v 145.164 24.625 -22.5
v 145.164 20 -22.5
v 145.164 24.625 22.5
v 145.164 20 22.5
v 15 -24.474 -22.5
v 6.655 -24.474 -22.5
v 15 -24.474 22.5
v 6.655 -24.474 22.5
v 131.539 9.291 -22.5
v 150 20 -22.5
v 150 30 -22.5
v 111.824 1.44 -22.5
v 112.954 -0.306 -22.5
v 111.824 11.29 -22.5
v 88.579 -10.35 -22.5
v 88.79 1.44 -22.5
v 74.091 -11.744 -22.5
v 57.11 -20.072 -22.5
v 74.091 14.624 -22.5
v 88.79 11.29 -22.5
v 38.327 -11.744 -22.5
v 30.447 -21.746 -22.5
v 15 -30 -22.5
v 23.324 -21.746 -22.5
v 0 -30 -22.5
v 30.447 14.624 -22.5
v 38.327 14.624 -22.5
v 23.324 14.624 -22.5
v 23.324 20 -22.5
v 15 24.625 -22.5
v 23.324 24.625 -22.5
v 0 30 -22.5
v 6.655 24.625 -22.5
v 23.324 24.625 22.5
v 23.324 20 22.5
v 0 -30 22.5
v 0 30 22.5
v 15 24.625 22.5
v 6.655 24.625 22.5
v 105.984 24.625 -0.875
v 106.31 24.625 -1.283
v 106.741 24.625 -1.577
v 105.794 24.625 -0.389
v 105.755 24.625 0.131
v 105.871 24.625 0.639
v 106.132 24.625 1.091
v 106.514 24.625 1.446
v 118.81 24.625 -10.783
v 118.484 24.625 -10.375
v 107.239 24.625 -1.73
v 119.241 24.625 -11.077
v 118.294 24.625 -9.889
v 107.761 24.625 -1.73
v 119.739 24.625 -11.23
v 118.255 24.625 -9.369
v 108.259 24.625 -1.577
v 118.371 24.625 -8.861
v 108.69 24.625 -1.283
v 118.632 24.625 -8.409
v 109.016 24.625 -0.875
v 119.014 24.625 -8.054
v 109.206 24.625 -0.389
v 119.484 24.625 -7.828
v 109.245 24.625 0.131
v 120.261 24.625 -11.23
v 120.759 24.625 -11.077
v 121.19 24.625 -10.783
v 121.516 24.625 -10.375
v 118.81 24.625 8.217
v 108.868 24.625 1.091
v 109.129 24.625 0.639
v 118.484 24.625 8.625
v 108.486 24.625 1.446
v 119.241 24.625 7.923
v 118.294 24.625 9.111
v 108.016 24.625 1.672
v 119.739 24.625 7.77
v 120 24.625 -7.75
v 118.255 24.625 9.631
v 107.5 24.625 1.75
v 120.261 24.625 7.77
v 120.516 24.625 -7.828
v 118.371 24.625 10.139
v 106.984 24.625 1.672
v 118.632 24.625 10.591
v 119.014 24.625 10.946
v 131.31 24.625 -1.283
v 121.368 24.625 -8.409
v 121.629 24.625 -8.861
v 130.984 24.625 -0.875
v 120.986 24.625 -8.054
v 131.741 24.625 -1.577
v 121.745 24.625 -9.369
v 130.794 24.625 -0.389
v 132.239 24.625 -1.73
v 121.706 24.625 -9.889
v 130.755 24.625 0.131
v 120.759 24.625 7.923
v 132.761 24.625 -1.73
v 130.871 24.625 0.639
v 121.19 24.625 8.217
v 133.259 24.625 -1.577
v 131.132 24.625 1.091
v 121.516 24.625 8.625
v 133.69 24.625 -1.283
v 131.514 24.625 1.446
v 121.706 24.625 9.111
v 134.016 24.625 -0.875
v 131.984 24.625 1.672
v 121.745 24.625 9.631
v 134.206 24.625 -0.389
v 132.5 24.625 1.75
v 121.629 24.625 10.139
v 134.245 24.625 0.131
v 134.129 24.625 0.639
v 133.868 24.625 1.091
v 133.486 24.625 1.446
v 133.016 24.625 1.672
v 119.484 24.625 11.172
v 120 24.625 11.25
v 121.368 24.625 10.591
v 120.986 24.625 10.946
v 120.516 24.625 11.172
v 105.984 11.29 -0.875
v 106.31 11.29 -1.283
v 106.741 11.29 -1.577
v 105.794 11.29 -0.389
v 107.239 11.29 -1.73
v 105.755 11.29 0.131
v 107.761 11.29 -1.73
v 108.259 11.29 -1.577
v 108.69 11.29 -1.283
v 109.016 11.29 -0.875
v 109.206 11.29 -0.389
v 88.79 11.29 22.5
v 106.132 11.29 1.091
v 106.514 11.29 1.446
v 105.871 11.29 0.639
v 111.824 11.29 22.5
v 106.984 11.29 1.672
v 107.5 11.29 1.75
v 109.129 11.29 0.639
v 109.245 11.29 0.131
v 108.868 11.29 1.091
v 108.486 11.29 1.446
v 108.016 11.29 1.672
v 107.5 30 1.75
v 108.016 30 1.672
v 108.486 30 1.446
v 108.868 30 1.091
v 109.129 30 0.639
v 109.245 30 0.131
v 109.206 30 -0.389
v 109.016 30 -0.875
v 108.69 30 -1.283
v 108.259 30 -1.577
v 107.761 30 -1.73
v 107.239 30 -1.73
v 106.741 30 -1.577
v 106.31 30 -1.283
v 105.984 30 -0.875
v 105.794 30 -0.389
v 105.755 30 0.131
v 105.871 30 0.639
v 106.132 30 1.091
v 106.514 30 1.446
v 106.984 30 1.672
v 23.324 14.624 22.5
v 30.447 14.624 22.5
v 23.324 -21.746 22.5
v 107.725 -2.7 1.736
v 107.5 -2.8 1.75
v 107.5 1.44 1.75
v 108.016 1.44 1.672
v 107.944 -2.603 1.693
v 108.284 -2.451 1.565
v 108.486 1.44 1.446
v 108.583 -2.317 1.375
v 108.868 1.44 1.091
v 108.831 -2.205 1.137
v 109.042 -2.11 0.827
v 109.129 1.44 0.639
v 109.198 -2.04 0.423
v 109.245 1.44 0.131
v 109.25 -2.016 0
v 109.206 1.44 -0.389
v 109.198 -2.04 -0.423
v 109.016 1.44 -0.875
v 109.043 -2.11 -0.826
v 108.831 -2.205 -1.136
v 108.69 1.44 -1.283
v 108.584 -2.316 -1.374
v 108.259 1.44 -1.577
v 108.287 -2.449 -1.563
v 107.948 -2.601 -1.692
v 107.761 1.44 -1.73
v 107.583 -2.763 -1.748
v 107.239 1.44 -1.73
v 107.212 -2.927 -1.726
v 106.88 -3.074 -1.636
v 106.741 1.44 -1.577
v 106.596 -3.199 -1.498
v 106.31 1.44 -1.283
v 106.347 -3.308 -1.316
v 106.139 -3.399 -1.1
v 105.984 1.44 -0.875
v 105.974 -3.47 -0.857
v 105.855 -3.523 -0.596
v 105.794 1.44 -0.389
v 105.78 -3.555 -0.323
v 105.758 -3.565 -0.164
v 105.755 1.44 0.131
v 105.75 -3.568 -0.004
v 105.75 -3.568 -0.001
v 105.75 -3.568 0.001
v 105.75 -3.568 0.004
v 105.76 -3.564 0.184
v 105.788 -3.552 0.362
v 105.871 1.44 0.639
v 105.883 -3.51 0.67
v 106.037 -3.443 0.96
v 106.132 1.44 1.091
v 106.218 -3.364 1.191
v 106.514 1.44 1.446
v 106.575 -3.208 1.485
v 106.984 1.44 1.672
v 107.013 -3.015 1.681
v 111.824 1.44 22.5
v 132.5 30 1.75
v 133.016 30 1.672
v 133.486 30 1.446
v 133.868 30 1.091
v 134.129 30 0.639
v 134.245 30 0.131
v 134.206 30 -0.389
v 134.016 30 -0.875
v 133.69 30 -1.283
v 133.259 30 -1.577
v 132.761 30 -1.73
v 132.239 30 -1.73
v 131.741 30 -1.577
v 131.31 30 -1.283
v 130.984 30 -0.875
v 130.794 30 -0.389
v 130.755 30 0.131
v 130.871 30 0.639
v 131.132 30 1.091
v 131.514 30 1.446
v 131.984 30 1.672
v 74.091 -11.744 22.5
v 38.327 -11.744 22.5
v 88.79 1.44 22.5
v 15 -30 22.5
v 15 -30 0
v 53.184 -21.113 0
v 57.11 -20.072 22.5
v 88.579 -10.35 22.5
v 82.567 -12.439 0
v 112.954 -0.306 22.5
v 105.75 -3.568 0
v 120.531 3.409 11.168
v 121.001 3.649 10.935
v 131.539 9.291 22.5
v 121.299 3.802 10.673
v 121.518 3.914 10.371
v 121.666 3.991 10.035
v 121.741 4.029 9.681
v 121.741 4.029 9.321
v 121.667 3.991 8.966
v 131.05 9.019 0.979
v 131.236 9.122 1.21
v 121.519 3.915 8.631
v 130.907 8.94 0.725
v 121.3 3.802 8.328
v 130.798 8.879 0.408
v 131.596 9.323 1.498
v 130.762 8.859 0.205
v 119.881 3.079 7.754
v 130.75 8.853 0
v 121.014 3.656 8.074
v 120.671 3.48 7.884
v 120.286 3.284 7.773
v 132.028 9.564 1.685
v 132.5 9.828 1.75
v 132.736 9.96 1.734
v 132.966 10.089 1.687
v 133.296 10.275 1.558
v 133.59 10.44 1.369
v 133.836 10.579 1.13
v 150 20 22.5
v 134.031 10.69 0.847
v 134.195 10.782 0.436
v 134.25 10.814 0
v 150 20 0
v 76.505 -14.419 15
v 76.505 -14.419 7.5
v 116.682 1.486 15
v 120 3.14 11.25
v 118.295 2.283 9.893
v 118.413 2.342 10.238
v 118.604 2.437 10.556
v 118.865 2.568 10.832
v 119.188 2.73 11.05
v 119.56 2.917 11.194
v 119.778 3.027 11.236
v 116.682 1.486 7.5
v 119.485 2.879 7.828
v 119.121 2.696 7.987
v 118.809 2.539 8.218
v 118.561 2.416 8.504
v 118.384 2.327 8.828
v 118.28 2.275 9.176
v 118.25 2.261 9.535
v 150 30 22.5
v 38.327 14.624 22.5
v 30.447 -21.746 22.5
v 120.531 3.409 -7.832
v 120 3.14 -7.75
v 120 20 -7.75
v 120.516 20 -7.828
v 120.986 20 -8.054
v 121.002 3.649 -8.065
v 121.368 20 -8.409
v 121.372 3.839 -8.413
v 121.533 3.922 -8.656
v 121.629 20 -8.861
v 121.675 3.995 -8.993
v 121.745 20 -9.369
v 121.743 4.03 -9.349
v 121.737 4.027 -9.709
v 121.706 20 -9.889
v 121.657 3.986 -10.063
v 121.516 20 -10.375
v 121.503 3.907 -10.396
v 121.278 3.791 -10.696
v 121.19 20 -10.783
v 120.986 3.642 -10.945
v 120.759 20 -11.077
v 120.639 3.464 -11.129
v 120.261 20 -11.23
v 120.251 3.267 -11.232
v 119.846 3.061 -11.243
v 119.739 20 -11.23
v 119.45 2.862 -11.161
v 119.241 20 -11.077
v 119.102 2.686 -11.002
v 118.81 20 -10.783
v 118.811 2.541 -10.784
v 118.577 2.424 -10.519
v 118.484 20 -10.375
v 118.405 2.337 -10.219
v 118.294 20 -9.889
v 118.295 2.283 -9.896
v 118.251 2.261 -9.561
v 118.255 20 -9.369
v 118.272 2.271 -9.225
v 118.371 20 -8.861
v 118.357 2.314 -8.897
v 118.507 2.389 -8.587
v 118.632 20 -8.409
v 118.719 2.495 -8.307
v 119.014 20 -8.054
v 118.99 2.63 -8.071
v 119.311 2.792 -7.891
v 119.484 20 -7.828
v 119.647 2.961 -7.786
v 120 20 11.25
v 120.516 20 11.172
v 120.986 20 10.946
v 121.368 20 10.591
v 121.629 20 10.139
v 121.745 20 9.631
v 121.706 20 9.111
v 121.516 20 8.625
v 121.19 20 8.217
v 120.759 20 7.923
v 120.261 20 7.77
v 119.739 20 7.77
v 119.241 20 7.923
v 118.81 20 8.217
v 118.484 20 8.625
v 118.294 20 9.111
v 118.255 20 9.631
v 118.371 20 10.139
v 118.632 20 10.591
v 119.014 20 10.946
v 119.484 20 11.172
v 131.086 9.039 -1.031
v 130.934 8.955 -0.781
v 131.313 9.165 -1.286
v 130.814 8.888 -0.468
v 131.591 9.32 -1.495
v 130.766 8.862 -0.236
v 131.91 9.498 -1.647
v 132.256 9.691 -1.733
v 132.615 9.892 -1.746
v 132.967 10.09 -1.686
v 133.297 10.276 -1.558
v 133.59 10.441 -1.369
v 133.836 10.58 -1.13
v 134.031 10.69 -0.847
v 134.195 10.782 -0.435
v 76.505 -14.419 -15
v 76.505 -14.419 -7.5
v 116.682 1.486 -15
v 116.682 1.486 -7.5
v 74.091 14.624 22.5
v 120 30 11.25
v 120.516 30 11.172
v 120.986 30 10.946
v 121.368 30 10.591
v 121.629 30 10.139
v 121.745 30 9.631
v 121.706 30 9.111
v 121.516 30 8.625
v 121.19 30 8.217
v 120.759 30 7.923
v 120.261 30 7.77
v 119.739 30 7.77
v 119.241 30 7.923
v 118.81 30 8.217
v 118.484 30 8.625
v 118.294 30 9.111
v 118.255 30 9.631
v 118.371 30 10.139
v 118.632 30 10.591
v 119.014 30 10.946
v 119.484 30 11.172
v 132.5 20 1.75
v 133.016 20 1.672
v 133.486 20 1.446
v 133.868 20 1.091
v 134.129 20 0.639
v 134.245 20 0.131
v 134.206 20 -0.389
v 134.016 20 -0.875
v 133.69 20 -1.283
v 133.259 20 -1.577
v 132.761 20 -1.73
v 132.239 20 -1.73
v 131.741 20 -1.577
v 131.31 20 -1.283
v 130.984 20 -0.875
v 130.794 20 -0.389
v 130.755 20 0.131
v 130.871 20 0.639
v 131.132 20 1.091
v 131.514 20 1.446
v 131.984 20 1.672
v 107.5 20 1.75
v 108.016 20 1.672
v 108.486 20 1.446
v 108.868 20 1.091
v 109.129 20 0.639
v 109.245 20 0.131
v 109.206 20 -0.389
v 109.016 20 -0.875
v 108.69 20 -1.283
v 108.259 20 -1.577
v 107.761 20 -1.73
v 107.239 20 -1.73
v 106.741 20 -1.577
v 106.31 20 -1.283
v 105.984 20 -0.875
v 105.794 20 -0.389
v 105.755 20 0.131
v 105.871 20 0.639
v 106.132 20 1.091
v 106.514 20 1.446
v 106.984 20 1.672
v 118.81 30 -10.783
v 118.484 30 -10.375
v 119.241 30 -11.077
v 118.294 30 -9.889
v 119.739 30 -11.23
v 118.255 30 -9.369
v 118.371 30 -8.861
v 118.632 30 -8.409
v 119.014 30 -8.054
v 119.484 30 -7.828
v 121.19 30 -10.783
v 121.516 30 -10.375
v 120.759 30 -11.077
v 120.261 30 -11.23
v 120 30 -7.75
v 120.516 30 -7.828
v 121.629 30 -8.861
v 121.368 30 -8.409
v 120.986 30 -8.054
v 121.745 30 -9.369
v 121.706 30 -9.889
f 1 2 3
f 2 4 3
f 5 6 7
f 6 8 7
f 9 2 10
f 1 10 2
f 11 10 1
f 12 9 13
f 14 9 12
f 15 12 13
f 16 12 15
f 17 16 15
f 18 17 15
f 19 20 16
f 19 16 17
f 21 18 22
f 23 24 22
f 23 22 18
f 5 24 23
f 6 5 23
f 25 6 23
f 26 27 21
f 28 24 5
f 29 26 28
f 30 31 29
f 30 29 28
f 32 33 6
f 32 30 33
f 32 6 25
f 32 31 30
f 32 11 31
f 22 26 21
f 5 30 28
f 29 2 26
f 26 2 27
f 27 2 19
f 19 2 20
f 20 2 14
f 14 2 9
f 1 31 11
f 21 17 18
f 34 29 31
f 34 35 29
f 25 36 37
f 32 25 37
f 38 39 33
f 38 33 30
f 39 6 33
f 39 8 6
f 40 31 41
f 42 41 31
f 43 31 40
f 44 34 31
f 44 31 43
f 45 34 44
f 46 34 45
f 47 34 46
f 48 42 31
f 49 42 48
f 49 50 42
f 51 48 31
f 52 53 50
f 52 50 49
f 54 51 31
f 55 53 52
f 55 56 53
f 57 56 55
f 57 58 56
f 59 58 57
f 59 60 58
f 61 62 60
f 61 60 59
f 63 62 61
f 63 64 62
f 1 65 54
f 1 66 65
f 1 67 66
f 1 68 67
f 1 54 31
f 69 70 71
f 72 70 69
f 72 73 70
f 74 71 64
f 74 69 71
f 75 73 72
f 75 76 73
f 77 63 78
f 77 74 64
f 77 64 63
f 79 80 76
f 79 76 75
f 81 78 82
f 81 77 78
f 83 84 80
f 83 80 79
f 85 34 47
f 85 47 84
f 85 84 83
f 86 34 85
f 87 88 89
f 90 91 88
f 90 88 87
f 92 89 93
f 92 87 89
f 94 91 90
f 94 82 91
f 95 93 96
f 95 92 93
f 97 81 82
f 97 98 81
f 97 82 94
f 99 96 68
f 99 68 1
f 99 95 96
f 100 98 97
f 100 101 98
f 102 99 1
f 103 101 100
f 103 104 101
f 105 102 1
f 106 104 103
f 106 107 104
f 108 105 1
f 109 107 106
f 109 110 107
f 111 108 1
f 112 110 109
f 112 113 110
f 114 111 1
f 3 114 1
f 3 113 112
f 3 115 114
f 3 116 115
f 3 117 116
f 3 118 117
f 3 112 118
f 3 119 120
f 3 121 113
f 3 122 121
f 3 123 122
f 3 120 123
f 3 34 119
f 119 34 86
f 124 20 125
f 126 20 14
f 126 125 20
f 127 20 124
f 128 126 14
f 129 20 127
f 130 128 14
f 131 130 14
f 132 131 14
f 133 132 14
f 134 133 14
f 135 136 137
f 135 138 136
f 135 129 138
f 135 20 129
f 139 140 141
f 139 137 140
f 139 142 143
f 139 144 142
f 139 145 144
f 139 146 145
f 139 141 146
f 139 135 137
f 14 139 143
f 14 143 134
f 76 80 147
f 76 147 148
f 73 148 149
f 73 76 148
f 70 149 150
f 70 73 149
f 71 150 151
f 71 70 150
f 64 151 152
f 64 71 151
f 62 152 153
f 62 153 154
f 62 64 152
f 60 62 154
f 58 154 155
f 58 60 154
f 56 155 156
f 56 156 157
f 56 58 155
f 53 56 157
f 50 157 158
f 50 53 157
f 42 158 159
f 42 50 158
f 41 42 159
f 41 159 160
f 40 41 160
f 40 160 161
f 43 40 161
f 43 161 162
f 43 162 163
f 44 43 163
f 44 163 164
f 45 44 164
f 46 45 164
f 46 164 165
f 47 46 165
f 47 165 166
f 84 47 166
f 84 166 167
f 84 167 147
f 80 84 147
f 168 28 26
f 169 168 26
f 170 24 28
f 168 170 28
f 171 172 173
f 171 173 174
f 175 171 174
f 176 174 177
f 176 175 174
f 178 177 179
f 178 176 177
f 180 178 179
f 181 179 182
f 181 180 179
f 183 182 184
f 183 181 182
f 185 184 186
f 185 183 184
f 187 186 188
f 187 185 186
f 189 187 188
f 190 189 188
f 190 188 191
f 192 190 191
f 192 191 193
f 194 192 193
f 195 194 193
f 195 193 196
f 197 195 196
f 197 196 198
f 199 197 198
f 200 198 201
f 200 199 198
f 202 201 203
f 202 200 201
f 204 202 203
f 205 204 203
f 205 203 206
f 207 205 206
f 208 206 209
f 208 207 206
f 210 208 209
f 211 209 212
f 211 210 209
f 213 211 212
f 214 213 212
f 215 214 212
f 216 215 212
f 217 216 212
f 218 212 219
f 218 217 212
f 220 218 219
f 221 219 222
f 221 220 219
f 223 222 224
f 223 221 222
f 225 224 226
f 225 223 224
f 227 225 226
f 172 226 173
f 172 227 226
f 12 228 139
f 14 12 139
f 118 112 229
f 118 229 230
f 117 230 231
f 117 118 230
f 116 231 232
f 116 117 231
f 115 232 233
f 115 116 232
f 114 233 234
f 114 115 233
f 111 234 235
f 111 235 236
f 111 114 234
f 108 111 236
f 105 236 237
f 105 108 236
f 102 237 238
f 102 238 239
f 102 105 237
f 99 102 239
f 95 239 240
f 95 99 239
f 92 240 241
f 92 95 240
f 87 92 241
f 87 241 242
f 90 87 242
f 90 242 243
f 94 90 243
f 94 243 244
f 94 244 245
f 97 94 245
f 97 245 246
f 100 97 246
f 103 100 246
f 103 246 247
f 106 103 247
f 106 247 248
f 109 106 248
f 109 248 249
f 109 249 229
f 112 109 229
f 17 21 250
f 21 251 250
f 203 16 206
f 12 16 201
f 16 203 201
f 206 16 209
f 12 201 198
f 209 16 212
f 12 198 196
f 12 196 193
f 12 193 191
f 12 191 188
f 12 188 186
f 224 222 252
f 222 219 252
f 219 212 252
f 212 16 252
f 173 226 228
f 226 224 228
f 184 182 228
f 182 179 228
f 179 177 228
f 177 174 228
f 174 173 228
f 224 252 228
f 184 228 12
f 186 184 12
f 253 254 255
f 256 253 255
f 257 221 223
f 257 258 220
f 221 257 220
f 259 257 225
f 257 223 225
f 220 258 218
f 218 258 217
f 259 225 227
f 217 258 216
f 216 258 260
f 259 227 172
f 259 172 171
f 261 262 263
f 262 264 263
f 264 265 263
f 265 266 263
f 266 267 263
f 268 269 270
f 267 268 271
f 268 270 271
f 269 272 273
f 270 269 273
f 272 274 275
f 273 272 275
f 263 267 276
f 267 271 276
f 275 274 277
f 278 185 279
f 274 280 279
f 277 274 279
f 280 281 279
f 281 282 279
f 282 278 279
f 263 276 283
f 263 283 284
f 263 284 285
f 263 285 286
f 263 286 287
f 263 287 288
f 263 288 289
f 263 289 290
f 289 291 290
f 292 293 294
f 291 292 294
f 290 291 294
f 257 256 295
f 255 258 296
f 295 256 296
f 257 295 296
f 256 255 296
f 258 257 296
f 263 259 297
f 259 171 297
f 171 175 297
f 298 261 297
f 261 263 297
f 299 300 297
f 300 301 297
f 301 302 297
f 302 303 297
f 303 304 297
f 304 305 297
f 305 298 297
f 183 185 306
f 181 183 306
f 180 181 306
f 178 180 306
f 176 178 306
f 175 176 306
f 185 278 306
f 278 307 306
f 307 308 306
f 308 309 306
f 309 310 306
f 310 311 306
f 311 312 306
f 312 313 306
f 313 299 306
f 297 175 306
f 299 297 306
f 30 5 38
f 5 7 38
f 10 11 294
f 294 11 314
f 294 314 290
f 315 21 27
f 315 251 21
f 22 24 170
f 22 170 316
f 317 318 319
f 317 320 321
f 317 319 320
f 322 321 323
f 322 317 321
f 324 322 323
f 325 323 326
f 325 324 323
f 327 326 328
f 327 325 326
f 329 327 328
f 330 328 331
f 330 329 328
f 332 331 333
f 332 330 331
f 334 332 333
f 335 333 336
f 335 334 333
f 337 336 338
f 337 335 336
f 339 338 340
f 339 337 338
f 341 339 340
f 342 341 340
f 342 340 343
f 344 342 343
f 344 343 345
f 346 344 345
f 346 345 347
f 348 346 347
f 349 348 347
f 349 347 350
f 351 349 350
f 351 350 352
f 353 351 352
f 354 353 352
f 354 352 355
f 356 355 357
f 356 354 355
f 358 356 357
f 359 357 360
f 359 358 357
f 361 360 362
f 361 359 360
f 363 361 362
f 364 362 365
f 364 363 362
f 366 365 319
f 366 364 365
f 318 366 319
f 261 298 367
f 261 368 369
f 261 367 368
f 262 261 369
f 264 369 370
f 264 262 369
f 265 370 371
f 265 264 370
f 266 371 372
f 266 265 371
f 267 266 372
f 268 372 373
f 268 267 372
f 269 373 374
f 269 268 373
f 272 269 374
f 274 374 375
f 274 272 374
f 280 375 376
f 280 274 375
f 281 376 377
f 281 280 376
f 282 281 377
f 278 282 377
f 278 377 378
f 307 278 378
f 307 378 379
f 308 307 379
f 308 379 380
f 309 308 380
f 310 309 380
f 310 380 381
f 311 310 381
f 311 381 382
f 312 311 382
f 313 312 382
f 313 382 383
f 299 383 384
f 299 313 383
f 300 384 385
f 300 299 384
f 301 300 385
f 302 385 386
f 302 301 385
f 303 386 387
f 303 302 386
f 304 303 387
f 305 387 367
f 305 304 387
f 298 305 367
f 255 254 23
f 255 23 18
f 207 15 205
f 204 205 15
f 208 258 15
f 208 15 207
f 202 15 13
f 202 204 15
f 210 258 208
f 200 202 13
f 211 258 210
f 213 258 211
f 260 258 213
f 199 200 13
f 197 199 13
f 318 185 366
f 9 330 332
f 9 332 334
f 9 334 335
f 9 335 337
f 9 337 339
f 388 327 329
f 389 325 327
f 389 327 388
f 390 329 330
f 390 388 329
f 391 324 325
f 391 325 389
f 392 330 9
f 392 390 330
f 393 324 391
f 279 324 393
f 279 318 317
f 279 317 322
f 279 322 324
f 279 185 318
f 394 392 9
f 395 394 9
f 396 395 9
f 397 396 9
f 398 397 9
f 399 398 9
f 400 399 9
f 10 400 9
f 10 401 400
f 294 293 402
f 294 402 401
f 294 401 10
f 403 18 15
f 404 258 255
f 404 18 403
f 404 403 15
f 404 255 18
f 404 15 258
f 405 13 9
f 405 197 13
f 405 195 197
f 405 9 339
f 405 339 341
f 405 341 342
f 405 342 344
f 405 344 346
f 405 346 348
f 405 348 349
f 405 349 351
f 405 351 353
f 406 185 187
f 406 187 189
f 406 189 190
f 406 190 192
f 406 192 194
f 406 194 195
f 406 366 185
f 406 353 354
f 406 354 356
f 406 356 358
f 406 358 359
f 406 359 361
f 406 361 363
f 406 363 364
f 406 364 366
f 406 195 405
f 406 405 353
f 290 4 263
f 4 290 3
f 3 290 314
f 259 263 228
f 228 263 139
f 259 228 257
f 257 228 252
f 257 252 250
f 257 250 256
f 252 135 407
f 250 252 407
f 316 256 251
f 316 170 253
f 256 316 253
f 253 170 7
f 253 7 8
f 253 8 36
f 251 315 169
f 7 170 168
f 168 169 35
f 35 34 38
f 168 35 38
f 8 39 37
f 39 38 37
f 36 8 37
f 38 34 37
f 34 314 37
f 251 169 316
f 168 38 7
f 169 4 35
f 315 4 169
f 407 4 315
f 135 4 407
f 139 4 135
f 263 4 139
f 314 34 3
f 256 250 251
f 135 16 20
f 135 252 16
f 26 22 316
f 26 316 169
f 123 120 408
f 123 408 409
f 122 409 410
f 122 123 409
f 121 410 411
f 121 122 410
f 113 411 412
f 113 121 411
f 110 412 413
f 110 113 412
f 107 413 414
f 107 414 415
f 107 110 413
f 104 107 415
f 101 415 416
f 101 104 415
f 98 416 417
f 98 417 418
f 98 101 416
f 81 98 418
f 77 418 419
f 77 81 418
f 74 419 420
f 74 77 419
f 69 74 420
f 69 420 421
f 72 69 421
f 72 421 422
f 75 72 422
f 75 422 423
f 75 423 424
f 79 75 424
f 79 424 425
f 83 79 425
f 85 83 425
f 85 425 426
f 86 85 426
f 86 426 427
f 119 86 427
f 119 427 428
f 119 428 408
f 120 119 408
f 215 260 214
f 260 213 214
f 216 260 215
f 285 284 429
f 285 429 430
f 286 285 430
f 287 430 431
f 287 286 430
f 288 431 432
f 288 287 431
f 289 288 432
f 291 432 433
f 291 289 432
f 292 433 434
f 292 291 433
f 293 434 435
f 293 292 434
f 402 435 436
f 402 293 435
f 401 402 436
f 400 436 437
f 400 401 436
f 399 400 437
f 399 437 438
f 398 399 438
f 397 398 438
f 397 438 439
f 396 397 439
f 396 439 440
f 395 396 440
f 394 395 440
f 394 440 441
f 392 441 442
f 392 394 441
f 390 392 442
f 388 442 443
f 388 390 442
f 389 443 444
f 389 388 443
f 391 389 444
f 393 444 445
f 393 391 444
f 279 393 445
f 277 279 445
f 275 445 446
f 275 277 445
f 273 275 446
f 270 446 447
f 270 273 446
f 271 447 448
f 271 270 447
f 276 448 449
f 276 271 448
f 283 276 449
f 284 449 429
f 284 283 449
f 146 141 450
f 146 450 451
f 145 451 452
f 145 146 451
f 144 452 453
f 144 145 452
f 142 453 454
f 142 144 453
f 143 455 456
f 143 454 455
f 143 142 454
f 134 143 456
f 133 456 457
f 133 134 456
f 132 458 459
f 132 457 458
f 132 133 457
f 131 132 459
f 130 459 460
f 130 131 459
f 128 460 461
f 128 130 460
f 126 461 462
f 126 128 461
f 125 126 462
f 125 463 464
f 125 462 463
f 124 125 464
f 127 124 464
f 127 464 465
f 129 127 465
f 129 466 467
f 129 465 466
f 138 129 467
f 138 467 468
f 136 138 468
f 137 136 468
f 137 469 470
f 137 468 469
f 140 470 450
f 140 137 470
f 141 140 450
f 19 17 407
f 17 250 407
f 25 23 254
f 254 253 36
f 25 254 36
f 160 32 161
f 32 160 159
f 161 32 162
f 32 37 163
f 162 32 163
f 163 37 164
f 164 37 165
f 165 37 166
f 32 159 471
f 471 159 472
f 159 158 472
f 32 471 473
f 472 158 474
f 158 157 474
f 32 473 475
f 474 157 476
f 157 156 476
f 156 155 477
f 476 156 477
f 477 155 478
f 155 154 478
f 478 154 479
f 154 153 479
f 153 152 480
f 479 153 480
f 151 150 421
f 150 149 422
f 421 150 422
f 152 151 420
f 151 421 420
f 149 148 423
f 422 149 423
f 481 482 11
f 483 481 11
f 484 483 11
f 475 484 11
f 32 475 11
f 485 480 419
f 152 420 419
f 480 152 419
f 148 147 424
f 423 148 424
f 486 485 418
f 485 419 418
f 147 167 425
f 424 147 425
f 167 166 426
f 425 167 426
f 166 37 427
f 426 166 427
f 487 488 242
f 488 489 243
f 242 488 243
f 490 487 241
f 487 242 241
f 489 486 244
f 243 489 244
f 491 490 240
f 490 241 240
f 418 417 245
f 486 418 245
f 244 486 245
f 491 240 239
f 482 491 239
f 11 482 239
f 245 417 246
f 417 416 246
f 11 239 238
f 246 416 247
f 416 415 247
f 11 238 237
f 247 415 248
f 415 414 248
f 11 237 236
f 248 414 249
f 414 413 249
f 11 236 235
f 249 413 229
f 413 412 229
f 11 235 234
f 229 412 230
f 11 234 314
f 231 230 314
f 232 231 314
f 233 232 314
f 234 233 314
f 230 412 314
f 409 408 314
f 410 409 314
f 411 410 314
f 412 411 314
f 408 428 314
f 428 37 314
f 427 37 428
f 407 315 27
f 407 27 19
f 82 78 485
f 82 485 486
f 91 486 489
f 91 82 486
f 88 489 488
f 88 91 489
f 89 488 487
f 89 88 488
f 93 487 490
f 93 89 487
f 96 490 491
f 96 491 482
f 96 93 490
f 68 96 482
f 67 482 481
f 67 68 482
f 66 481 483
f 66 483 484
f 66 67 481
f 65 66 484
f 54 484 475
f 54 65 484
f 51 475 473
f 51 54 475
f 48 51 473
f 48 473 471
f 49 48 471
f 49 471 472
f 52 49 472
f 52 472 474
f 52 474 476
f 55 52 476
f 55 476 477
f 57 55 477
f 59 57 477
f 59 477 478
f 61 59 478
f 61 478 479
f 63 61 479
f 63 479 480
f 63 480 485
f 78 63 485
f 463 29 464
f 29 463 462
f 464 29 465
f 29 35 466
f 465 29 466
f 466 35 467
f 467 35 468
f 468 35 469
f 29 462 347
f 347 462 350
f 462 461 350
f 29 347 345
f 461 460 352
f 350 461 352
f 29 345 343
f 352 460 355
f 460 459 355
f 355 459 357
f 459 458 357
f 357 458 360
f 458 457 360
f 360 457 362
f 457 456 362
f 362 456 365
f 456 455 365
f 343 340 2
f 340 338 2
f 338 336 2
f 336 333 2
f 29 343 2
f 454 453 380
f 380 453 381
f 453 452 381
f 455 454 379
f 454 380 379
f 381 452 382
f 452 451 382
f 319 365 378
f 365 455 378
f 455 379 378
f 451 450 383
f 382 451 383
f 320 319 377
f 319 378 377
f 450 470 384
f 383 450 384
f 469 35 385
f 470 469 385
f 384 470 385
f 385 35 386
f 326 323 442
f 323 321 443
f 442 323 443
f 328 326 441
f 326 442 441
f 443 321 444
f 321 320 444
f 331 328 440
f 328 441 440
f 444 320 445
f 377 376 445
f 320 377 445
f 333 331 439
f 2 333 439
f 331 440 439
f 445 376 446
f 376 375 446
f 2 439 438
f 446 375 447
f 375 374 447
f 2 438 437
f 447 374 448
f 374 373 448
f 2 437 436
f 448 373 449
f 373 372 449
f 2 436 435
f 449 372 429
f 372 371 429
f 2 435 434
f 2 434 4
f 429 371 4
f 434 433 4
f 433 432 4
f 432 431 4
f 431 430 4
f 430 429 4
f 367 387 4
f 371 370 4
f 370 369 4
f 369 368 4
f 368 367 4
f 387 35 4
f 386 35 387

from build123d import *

# Parameters (mm, degrees)
SKETCH3_W           = 8.345017316
SKETCH3_H           = 49.099302906
SKETCH3_W_2         = 121.839010914
SKETCH3_H_2         = 4.625421982
SKETCH3_W_3         = 7.122429743
SKETCH3_H_3         = 36.369854004
SKETCH3_W_4         = 35.763689771
SKETCH3_H_4         = 26.368144153
SKETCH3_W_5         = 23.034240869
SKETCH3_H_5         = 9.850168793
BOSS_EXTRUDE1_DEPTH = 22.5
CUT_EXTRUDE1_START  = -3.567987
SKETCH4_R           = 1.75
CUT_EXTRUDE1_DEPTH  = 33.567987


with BuildPart() as part:
    # Sketch3 → Boss-Extrude1 (new, symmetric)
    with BuildSketch(Plane.XY):
        with BuildLine():
            Line((0, -30), (0, 30))
            Line((0, 30), (150, 30))
            Line((150, 30), (150, 20))
            add(Edge.make_bspline(
                [(15, -30), (91.992434152, -13.820271626), (115.288714067, -0.58029396), (150, 20)],
                knots=[0, 0, 0, 0, 1, 1, 1, 1], degree=3))
            Line((15, -30), (0, -30))
        make_face()
        with Locations((10.827491342, 0.075770529)):
            Rectangle(SKETCH3_W, SKETCH3_H, mode=Mode.SUBTRACT)
        with Locations((84.244004559, 22.312710991)):
            Rectangle(SKETCH3_W_2, SKETCH3_H_2, mode=Mode.SUBTRACT)
        with Locations((26.885713974, -3.561214871)):
            Rectangle(SKETCH3_W_3, SKETCH3_H_3, mode=Mode.SUBTRACT)
        with Locations((56.208908765, 1.439640054)):
            Rectangle(SKETCH3_W_4, SKETCH3_H_4, mode=Mode.SUBTRACT)
        with Locations((100.307356745, 6.364724451)):
            Rectangle(SKETCH3_W_5, SKETCH3_H_5, mode=Mode.SUBTRACT)
    extrude(amount=BOSS_EXTRUDE1_DEPTH, both=True)

    # Sketch4 → Cut-Extrude1 (cut)
    with BuildSketch(Plane(origin=(0, 0, 0), x_dir=(1, 0, 0), z_dir=(0, 1, 0)).offset(CUT_EXTRUDE1_START)):
        with Locations(Location((107.5, 0, 0), (0, 0, 270))):
            Circle(SKETCH4_R)
        with Locations(Location((120, 9.5, 0), (0, 0, 270))):
            Circle(SKETCH4_R)
        with Locations(Location((132.5, 0, 0), (0, 0, 270))):
            Circle(SKETCH4_R)
        with Locations(Location((120, -9.5, 0), (0, 0, 270))):
            Circle(SKETCH4_R)
    extrude(amount=CUT_EXTRUDE1_DEPTH, mode=Mode.SUBTRACT)


solid = part.part
